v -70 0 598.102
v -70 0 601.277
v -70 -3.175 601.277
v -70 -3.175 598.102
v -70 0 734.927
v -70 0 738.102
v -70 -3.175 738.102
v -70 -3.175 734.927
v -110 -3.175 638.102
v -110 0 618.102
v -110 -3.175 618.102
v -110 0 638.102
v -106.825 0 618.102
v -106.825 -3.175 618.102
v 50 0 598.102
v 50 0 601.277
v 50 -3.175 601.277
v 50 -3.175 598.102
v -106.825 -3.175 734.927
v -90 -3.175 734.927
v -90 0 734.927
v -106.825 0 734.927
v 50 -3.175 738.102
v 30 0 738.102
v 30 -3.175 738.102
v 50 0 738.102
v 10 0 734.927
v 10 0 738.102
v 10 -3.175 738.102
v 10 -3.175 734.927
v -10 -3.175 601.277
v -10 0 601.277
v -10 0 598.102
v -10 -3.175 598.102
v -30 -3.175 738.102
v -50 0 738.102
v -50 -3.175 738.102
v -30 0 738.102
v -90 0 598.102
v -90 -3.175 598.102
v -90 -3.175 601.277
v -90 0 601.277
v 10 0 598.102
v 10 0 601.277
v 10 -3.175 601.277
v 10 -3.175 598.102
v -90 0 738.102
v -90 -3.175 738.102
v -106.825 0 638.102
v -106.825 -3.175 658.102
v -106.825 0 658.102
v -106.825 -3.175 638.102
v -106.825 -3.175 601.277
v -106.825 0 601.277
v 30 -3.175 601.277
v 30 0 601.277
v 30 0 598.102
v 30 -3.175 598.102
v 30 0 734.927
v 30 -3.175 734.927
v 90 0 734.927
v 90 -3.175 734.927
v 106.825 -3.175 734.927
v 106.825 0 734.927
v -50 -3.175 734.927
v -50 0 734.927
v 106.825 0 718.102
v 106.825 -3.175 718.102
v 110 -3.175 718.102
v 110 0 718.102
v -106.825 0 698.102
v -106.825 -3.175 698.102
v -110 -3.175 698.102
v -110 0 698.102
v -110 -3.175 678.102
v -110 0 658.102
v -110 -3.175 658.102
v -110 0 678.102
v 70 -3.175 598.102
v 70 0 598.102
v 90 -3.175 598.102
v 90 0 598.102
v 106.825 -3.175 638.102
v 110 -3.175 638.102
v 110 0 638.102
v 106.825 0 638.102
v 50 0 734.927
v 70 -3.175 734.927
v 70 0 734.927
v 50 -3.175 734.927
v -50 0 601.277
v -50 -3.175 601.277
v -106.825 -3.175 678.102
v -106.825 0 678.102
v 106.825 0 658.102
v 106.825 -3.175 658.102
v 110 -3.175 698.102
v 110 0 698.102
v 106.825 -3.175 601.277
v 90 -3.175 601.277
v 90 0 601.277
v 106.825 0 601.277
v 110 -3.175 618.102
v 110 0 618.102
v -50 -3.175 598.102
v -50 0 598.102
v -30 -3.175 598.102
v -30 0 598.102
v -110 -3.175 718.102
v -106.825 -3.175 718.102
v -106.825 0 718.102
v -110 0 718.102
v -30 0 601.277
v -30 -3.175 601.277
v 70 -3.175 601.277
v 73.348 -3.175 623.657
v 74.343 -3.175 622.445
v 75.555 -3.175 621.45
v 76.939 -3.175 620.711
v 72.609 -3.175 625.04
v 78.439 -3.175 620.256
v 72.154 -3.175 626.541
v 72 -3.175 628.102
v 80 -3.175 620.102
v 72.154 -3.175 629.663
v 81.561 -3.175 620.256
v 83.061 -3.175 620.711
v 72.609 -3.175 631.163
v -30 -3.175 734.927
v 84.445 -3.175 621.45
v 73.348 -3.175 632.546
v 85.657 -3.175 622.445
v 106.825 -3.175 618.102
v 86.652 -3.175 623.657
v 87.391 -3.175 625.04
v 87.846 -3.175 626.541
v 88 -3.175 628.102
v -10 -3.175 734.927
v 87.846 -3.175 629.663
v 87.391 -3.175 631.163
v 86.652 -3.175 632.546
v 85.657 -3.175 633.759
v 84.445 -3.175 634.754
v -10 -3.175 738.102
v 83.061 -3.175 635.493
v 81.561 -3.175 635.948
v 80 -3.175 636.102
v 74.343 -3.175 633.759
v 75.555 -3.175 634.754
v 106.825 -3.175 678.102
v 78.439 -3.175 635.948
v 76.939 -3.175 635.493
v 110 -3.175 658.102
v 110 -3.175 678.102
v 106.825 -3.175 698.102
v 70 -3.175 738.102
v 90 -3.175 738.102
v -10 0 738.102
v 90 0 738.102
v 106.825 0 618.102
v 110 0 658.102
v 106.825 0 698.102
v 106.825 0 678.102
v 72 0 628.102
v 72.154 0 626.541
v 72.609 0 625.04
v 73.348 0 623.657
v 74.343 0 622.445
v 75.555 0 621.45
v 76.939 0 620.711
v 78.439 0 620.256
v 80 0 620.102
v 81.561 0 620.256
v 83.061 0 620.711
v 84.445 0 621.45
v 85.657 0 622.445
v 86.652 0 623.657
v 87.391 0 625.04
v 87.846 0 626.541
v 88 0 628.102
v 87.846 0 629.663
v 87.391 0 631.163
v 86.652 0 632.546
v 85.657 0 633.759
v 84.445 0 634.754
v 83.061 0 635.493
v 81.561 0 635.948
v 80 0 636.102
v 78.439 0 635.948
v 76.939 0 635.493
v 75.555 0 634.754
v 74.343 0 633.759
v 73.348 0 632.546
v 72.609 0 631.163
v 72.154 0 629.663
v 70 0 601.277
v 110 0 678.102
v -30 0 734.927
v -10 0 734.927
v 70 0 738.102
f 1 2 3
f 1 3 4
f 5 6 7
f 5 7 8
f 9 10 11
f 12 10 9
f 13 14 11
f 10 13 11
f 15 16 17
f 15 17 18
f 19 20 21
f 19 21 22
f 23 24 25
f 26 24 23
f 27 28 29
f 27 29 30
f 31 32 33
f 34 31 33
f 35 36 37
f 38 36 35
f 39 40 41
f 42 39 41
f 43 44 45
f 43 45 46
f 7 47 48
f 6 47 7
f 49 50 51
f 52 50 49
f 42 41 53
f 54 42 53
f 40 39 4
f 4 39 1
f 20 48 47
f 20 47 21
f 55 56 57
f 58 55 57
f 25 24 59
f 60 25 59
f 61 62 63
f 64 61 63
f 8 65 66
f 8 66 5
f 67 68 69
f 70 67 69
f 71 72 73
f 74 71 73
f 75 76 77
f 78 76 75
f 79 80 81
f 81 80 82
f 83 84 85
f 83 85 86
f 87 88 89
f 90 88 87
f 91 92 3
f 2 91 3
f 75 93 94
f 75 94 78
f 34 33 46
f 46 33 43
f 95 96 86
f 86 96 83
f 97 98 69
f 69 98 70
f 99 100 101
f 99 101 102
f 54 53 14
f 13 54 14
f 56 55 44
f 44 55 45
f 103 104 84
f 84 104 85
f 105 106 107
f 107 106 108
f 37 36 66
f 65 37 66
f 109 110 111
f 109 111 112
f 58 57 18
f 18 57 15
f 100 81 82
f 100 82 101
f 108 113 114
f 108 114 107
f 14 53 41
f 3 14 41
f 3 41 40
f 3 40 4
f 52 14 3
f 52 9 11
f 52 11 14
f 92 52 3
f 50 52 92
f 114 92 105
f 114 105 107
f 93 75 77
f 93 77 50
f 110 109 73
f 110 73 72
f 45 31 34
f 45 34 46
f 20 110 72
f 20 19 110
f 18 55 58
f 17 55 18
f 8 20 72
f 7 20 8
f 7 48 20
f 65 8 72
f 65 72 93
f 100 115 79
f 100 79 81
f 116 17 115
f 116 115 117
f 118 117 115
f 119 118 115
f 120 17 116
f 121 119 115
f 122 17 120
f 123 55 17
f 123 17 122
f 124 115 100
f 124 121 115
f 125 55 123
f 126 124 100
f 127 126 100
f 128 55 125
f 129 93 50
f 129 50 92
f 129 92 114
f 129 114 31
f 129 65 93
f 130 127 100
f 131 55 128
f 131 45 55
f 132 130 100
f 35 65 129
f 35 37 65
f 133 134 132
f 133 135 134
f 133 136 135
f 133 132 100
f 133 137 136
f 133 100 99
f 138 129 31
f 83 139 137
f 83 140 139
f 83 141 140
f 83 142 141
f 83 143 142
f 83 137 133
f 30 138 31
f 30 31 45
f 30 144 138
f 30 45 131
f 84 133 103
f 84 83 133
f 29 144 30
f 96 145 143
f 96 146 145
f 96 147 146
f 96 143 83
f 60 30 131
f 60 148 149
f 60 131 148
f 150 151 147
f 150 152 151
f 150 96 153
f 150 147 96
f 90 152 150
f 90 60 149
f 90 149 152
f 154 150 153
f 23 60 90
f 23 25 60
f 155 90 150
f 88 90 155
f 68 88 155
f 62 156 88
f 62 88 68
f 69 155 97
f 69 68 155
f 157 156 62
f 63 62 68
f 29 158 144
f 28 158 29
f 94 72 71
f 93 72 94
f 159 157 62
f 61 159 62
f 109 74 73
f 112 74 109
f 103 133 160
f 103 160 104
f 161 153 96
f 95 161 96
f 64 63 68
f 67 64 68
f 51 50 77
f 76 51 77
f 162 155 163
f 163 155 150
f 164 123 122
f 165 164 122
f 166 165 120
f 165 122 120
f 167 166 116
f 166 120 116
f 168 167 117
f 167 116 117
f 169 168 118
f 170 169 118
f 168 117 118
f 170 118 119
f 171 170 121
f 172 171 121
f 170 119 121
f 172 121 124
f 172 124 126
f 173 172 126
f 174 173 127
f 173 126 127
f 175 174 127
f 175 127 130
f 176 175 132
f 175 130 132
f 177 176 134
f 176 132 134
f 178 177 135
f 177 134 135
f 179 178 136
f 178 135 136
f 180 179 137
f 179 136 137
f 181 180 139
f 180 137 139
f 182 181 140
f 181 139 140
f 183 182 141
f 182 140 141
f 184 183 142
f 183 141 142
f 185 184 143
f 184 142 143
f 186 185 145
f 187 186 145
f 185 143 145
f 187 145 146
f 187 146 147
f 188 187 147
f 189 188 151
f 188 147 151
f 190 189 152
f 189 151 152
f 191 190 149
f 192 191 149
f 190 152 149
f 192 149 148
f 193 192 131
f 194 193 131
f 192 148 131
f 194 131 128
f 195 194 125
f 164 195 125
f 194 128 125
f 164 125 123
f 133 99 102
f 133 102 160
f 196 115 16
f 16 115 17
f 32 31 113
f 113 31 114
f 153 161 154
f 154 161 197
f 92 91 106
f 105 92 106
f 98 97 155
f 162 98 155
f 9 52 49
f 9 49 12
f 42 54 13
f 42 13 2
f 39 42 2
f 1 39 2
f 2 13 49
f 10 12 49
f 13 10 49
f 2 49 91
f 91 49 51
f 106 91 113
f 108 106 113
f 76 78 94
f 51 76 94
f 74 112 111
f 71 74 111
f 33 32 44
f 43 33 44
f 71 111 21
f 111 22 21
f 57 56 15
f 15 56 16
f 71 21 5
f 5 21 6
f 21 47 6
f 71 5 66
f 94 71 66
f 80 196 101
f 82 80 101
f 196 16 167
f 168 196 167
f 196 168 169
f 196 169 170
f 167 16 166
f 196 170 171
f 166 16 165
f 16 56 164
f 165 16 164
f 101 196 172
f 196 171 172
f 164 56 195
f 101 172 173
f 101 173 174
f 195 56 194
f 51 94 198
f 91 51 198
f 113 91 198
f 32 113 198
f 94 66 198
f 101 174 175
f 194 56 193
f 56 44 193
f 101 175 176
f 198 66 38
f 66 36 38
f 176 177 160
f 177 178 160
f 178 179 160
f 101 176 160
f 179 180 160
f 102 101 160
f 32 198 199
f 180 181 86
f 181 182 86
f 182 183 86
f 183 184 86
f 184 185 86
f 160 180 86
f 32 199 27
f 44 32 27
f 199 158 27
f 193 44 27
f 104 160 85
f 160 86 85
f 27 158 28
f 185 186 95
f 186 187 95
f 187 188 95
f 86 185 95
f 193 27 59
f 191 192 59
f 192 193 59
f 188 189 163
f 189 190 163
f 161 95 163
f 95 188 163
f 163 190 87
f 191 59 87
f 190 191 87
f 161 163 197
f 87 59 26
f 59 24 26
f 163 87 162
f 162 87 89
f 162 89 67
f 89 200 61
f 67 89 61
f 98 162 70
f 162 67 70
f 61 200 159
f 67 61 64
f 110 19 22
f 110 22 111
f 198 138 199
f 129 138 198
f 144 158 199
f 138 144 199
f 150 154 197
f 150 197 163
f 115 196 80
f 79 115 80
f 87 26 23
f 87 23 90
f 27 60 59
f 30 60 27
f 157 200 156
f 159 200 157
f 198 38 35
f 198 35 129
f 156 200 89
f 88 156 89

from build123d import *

# Parameters (mm, degrees)
SKETCH48_W           = 219.999999786
SKETCH48_H           = 140
BOSS_EXTRUDE12_DEPTH = 3.175
SKETCH49_R           = 8
SKETCH49_W           = 20
SKETCH49_H           = 3.175
SKETCH49_W_2         = 3.175
SKETCH49_H_2         = 20
CUT_EXTRUDE24_DEPTH  = 3.175


with BuildPart() as part:
    # Sketch48 → Boss-Extrude12 (new body)
    with BuildSketch(Plane.XZ):
        with Locations((-4.307e-06, 668.101928689)):
            Rectangle(SKETCH48_W, SKETCH48_H)
    extrude(amount=BOSS_EXTRUDE12_DEPTH)

    # Sketch49 → Cut-Extrude24 (cut)
    with BuildSketch(Plane(origin=(0, -3.175, 0), x_dir=(-1, 0, 0), z_dir=(0, -1, 0))):
        with Locations((-79.999995586, -628.101928689)):
            Circle(SKETCH49_R)
        with Locations((60.0000042, -736.514428689)):
            Rectangle(SKETCH49_W, SKETCH49_H)
        Polygon((110.0000042, -738.101928689), (90.0000042, -738.101928689), (90.0000042, -734.926928689), (106.8250042, -734.926928689), (106.8250042, -718.101928689), (110.0000042, -718.101928689), align=None)
        with Locations((20.0000042, -736.514428689)):
            Rectangle(SKETCH49_W, SKETCH49_H)
        with Locations((-19.9999958, -736.514428689)):
            Rectangle(SKETCH49_W, SKETCH49_H)
        with Locations((-59.9999958, -736.514428689)):
            Rectangle(SKETCH49_W, SKETCH49_H)
        Polygon((-89.9999958, -738.101928689), (-89.9999958, -734.926928689), (-106.824995586, -734.926928689), (-106.824995586, -718.101928689), (-109.999995586, -718.101928689), (-109.9999958, -738.101928689), align=None)
        with Locations((60.0000042, -599.689428689)):
            Rectangle(SKETCH49_W, SKETCH49_H)
        Polygon((110.0000042, -598.101928689), (90.0000042, -598.101928689), (90.0000042, -601.276928689), (106.8250042, -601.276928689), (106.8250042, -618.101928689), (110.0000042, -618.101928689), align=None)
        with Locations((20.0000042, -599.689428689)):
            Rectangle(SKETCH49_W, SKETCH49_H)
        with Locations((-19.9999958, -599.689428689)):
            Rectangle(SKETCH49_W, SKETCH49_H)
        with Locations((-59.9999958, -599.689428689)):
            Rectangle(SKETCH49_W, SKETCH49_H)
        Polygon((-89.9999958, -598.101928689), (-89.9999958, -601.276928689), (-106.824995586, -601.276928689), (-106.824995586, -618.101928689), (-109.999995586, -618.101928689), (-109.9999958, -598.101928689), align=None)
        with Locations((108.4125042, -648.101928689)):
            Rectangle(SKETCH49_W_2, SKETCH49_H_2)
        with Locations((108.4125042, -688.101928689)):
            Rectangle(SKETCH49_W_2, SKETCH49_H_2)
        with Locations((-108.412495586, -648.101928689)):
            Rectangle(SKETCH49_W_2, SKETCH49_H_2)
        with Locations((-108.412495586, -688.101928689)):
            Rectangle(SKETCH49_W_2, SKETCH49_H_2)
    extrude(amount=-CUT_EXTRUDE24_DEPTH, mode=Mode.SUBTRACT)


solid = part.part
